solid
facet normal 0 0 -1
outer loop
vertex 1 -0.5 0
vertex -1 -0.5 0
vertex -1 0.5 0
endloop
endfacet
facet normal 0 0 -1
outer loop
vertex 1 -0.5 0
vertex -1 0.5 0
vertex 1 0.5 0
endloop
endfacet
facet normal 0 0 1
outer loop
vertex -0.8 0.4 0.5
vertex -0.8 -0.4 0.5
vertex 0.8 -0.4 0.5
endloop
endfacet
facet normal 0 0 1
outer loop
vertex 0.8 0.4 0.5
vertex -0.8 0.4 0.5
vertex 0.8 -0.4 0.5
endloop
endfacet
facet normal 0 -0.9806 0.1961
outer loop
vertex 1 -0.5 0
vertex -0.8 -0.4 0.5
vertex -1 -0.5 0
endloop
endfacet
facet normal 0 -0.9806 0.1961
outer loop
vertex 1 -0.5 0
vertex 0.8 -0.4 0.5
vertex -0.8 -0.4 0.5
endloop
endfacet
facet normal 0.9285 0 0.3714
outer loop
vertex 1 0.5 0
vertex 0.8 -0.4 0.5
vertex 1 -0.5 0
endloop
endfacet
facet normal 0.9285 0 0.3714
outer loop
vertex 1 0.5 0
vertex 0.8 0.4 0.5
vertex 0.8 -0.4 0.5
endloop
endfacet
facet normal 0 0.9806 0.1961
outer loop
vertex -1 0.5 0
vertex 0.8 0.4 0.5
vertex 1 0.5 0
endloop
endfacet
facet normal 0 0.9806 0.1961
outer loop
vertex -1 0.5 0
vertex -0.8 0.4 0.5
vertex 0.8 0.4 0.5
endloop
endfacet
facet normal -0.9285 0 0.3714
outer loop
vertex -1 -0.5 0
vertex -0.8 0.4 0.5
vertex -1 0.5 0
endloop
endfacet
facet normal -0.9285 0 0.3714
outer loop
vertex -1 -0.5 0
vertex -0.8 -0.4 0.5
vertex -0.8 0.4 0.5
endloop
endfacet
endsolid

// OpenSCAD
module ingot(Mat = 0){

    //Color = [Main Body, Pocket] 
    bronze = ["#CD7F32","#7b4c1e"]; 
    silver = ["#c4aead","#cdc9c9"];
    gold = ["#ffd700","#daa520"];

    Material = [bronze,silver,gold];

    color(Material[Mat][0])
    linear_extrude(height = 0.5, scale = 0.8)
    square([2,1], center = true);


}

ingot(Mat = 1);
